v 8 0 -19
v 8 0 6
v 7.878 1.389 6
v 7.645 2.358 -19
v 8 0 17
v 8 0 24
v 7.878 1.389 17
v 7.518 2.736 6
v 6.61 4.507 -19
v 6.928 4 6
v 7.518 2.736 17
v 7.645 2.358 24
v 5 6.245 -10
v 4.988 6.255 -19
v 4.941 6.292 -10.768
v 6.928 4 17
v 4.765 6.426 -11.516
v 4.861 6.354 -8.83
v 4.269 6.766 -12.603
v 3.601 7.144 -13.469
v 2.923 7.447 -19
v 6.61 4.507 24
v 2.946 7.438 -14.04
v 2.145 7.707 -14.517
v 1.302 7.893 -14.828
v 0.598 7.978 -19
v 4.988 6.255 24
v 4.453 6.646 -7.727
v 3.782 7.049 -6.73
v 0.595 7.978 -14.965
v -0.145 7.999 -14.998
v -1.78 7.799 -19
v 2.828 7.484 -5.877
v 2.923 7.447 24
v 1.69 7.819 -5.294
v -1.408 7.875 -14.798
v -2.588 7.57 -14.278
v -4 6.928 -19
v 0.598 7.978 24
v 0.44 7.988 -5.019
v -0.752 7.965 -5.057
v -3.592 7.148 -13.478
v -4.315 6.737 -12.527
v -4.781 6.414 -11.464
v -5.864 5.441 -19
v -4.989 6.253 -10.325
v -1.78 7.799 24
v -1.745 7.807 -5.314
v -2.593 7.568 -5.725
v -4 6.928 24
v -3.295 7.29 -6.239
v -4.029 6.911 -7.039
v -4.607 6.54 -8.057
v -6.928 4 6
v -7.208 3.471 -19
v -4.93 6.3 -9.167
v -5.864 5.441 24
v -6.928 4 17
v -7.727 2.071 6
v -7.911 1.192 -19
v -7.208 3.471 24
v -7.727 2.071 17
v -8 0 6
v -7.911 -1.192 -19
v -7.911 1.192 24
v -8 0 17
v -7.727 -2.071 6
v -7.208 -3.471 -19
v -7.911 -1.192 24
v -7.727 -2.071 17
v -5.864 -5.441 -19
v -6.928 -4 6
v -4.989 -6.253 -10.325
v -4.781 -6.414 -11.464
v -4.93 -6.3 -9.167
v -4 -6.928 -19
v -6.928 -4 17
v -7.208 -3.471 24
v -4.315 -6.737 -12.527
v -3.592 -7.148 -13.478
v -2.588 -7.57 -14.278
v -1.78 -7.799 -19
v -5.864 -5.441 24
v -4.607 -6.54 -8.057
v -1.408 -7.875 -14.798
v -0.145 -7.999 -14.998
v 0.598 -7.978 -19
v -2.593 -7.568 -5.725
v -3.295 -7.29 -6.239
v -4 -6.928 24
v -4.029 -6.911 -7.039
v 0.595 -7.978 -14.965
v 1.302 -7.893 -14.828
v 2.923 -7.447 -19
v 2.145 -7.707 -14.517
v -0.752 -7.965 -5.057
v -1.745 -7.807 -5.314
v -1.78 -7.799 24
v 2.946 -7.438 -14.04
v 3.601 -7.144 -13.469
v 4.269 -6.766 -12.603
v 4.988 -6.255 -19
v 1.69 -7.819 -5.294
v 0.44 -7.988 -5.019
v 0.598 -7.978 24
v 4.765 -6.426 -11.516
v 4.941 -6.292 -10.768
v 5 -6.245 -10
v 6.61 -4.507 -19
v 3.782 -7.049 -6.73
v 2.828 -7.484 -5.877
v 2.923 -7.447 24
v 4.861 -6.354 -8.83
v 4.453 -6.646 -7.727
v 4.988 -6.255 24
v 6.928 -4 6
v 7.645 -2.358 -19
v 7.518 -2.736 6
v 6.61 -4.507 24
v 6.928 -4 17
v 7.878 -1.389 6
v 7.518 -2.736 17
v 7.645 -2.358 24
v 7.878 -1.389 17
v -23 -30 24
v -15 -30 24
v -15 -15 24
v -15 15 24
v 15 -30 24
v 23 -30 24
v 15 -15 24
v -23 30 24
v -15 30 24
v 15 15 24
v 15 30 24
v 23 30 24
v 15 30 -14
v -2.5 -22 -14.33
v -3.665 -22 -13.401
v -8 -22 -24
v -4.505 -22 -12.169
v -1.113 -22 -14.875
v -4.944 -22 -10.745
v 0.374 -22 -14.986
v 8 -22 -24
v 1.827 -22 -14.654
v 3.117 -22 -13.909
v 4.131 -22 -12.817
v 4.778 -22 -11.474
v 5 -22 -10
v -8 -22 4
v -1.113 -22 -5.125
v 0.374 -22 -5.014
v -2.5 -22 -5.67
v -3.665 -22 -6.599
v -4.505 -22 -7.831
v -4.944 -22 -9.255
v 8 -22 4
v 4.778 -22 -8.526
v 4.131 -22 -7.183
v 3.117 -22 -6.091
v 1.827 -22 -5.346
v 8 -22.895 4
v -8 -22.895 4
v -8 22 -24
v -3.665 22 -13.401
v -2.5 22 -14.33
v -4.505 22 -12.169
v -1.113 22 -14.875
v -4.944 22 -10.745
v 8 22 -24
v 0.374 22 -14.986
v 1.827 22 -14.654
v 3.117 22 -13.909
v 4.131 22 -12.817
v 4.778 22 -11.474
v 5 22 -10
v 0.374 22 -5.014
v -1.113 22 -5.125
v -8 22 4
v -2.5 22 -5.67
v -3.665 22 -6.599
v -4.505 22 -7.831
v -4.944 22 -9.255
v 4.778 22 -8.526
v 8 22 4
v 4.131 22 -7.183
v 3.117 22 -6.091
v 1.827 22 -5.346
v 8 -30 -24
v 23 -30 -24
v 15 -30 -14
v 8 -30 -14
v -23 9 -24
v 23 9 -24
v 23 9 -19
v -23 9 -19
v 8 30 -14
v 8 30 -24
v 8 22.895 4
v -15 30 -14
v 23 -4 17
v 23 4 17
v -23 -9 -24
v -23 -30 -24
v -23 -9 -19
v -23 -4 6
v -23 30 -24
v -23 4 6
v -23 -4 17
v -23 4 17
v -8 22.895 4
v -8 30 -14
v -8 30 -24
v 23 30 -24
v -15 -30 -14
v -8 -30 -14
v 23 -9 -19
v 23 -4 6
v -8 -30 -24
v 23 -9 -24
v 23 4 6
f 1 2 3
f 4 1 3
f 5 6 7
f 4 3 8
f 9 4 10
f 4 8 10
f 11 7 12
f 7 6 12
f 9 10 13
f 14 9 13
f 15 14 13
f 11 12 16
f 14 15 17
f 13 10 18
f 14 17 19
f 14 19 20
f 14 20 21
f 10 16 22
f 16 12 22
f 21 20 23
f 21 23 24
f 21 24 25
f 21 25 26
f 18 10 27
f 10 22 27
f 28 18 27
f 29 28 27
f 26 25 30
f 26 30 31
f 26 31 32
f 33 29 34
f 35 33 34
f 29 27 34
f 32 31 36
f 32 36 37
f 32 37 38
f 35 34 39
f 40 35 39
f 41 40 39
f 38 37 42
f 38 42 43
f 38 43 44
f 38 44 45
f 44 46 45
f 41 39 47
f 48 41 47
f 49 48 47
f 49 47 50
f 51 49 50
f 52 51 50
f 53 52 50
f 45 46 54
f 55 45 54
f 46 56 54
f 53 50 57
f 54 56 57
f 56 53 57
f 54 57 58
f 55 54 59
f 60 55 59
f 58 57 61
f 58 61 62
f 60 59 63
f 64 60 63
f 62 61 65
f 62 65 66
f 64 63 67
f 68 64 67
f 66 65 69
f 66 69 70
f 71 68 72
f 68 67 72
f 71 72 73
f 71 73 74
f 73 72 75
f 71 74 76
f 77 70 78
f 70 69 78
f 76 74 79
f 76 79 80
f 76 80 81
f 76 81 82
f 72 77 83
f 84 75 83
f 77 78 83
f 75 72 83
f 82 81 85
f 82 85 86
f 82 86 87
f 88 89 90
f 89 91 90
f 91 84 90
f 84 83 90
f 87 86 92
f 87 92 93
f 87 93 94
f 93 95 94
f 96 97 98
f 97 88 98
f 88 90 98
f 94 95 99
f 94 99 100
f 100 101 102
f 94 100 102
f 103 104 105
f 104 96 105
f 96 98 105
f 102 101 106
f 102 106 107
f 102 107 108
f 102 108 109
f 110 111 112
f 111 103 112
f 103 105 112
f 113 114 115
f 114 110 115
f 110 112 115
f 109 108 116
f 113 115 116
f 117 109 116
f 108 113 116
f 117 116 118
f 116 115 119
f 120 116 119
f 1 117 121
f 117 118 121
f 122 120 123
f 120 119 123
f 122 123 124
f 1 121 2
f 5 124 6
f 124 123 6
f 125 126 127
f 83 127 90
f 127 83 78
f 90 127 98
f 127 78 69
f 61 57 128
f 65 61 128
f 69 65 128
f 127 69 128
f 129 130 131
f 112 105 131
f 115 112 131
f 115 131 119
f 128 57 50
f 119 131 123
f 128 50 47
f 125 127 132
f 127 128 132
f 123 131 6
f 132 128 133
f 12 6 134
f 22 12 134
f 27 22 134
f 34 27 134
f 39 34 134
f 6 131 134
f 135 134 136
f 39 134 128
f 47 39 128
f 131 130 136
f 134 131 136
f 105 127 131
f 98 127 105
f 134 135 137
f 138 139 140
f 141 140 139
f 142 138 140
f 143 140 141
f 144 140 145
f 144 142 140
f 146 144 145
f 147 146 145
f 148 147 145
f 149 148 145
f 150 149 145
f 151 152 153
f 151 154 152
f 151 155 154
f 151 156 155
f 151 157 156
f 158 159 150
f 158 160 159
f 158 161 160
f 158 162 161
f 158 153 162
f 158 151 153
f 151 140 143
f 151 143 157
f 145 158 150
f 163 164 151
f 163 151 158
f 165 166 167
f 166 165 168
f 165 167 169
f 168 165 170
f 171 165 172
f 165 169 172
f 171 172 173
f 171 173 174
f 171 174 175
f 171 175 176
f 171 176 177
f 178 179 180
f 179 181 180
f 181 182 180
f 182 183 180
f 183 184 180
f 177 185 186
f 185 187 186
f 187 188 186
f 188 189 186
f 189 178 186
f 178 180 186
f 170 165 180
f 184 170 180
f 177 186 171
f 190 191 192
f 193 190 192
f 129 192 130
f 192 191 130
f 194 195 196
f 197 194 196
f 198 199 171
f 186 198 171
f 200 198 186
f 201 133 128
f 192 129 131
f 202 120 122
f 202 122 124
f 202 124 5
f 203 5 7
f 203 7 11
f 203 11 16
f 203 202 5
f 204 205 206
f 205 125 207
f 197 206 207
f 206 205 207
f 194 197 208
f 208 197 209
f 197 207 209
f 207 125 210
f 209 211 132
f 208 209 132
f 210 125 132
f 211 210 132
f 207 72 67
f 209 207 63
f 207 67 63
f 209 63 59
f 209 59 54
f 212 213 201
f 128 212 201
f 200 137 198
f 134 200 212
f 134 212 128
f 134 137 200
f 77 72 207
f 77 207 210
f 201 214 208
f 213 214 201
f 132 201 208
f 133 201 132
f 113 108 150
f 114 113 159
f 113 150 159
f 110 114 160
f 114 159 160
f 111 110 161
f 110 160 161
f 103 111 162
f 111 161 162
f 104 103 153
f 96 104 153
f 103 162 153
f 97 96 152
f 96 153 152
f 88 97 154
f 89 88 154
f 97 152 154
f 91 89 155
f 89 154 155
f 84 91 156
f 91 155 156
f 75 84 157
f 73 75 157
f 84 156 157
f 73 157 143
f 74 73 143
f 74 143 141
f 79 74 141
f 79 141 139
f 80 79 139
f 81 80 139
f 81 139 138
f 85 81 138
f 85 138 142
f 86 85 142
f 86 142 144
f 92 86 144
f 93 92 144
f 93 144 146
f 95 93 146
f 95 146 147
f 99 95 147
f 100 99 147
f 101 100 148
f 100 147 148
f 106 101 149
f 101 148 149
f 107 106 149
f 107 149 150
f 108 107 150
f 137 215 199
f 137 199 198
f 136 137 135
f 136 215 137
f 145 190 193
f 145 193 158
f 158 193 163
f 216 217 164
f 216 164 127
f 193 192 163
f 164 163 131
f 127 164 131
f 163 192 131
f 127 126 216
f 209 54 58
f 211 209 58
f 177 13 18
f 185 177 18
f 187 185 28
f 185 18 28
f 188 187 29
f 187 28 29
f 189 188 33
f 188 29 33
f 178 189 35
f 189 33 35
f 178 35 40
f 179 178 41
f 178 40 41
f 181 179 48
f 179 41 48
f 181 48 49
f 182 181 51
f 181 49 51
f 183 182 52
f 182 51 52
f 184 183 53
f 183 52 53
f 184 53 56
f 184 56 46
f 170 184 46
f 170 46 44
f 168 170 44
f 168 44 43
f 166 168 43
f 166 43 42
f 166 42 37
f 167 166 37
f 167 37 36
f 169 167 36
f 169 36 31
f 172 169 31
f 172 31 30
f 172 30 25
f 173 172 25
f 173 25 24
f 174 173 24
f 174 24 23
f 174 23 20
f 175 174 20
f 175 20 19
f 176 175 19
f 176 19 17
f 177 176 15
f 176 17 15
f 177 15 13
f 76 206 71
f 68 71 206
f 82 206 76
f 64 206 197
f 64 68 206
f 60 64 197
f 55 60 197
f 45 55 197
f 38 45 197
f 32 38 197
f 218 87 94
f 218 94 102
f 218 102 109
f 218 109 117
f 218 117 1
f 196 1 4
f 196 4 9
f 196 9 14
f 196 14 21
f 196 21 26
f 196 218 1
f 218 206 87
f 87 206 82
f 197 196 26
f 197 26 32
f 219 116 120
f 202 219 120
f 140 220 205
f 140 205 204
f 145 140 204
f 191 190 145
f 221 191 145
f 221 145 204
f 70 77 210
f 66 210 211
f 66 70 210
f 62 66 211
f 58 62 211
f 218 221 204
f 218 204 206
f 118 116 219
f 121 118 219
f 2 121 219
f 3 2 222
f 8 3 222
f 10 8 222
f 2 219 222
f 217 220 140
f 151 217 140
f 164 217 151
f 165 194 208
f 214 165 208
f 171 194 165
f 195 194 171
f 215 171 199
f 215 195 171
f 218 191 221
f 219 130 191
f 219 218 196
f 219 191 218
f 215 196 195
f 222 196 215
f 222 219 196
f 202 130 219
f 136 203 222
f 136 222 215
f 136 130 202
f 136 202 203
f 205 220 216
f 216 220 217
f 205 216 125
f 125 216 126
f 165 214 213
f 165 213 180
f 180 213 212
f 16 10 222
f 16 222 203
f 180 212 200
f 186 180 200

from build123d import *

# Parameters (mm, degrees)
F0_W      = 60
F0_H      = 48
F0_W_2    = 8
F0_H_2    = 11
F1_DEPTH  = 23
F2_W      = 18
F2_H      = 5
F3_DEPTH  = 46.001
F5_DEPTH  = 15
F6_R      = 8
F7_DEPTH  = 48.001
F8_W      = 16
F8_H      = 28
F9_DEPTH  = 8
F10_R     = 5
F11_DEPTH = 52.001


# Not quite as in the source:
# - a pattern or mirror of a feature is missing from the dataset's text; its kind, count and spacing are read off the source's solid


with BuildPart() as f1:
    # F0 (on Right) → F1 (new body, symmetric)
    with BuildSketch(Plane.YZ):
        Rectangle(F0_W, F0_H)
        with Locations((0, 11.5)):
            Rectangle(F0_W_2, F0_H_2, mode=Mode.SUBTRACT)
    extrude(amount=F1_DEPTH, both=True)

    # F2 (on face) → F3 (cut, through all)
    with BuildSketch(Plane.YZ.offset(23)):
        with Locations((0, -21.5)):
            Rectangle(F2_W, F2_H)
    extrude(amount=-F3_DEPTH, mode=Mode.SUBTRACT)

    # F4 (on Right) → F5 (cut, symmetric)
    with BuildSketch(Plane.YZ):
        Polygon((-15, 24), (-30, 24), (-30, -14), align=None)
    f5 = extrude(amount=F5_DEPTH, both=True, mode=Mode.SUBTRACT)

    # F5_copies: F5 across plane
    add(f5.mirror(Plane.ZX), mode=Mode.SUBTRACT)

    # F6 (on face) → F7 (cut, through all)
    with BuildSketch(Plane.XY.offset(24)):
        Circle(F6_R)
    extrude(amount=-F7_DEPTH, mode=Mode.SUBTRACT)

    # F8 (on face) → F9 (cut)
    with BuildSketch(Plane.XZ.offset(30)):
        with Locations((0, -10)):
            Rectangle(F8_W, F8_H)
    f9 = extrude(amount=-F9_DEPTH, mode=Mode.SUBTRACT)

    # F9_copies: F9 across plane
    add(f9.mirror(Plane.ZX), mode=Mode.SUBTRACT)

    # F10 (on face) → F11 (cut, through all)
    with BuildSketch(Plane.XZ.offset(22)):
        with Locations((0, -10)):
            Circle(F10_R)
    extrude(amount=-F11_DEPTH, mode=Mode.SUBTRACT)


solid = f1.part
